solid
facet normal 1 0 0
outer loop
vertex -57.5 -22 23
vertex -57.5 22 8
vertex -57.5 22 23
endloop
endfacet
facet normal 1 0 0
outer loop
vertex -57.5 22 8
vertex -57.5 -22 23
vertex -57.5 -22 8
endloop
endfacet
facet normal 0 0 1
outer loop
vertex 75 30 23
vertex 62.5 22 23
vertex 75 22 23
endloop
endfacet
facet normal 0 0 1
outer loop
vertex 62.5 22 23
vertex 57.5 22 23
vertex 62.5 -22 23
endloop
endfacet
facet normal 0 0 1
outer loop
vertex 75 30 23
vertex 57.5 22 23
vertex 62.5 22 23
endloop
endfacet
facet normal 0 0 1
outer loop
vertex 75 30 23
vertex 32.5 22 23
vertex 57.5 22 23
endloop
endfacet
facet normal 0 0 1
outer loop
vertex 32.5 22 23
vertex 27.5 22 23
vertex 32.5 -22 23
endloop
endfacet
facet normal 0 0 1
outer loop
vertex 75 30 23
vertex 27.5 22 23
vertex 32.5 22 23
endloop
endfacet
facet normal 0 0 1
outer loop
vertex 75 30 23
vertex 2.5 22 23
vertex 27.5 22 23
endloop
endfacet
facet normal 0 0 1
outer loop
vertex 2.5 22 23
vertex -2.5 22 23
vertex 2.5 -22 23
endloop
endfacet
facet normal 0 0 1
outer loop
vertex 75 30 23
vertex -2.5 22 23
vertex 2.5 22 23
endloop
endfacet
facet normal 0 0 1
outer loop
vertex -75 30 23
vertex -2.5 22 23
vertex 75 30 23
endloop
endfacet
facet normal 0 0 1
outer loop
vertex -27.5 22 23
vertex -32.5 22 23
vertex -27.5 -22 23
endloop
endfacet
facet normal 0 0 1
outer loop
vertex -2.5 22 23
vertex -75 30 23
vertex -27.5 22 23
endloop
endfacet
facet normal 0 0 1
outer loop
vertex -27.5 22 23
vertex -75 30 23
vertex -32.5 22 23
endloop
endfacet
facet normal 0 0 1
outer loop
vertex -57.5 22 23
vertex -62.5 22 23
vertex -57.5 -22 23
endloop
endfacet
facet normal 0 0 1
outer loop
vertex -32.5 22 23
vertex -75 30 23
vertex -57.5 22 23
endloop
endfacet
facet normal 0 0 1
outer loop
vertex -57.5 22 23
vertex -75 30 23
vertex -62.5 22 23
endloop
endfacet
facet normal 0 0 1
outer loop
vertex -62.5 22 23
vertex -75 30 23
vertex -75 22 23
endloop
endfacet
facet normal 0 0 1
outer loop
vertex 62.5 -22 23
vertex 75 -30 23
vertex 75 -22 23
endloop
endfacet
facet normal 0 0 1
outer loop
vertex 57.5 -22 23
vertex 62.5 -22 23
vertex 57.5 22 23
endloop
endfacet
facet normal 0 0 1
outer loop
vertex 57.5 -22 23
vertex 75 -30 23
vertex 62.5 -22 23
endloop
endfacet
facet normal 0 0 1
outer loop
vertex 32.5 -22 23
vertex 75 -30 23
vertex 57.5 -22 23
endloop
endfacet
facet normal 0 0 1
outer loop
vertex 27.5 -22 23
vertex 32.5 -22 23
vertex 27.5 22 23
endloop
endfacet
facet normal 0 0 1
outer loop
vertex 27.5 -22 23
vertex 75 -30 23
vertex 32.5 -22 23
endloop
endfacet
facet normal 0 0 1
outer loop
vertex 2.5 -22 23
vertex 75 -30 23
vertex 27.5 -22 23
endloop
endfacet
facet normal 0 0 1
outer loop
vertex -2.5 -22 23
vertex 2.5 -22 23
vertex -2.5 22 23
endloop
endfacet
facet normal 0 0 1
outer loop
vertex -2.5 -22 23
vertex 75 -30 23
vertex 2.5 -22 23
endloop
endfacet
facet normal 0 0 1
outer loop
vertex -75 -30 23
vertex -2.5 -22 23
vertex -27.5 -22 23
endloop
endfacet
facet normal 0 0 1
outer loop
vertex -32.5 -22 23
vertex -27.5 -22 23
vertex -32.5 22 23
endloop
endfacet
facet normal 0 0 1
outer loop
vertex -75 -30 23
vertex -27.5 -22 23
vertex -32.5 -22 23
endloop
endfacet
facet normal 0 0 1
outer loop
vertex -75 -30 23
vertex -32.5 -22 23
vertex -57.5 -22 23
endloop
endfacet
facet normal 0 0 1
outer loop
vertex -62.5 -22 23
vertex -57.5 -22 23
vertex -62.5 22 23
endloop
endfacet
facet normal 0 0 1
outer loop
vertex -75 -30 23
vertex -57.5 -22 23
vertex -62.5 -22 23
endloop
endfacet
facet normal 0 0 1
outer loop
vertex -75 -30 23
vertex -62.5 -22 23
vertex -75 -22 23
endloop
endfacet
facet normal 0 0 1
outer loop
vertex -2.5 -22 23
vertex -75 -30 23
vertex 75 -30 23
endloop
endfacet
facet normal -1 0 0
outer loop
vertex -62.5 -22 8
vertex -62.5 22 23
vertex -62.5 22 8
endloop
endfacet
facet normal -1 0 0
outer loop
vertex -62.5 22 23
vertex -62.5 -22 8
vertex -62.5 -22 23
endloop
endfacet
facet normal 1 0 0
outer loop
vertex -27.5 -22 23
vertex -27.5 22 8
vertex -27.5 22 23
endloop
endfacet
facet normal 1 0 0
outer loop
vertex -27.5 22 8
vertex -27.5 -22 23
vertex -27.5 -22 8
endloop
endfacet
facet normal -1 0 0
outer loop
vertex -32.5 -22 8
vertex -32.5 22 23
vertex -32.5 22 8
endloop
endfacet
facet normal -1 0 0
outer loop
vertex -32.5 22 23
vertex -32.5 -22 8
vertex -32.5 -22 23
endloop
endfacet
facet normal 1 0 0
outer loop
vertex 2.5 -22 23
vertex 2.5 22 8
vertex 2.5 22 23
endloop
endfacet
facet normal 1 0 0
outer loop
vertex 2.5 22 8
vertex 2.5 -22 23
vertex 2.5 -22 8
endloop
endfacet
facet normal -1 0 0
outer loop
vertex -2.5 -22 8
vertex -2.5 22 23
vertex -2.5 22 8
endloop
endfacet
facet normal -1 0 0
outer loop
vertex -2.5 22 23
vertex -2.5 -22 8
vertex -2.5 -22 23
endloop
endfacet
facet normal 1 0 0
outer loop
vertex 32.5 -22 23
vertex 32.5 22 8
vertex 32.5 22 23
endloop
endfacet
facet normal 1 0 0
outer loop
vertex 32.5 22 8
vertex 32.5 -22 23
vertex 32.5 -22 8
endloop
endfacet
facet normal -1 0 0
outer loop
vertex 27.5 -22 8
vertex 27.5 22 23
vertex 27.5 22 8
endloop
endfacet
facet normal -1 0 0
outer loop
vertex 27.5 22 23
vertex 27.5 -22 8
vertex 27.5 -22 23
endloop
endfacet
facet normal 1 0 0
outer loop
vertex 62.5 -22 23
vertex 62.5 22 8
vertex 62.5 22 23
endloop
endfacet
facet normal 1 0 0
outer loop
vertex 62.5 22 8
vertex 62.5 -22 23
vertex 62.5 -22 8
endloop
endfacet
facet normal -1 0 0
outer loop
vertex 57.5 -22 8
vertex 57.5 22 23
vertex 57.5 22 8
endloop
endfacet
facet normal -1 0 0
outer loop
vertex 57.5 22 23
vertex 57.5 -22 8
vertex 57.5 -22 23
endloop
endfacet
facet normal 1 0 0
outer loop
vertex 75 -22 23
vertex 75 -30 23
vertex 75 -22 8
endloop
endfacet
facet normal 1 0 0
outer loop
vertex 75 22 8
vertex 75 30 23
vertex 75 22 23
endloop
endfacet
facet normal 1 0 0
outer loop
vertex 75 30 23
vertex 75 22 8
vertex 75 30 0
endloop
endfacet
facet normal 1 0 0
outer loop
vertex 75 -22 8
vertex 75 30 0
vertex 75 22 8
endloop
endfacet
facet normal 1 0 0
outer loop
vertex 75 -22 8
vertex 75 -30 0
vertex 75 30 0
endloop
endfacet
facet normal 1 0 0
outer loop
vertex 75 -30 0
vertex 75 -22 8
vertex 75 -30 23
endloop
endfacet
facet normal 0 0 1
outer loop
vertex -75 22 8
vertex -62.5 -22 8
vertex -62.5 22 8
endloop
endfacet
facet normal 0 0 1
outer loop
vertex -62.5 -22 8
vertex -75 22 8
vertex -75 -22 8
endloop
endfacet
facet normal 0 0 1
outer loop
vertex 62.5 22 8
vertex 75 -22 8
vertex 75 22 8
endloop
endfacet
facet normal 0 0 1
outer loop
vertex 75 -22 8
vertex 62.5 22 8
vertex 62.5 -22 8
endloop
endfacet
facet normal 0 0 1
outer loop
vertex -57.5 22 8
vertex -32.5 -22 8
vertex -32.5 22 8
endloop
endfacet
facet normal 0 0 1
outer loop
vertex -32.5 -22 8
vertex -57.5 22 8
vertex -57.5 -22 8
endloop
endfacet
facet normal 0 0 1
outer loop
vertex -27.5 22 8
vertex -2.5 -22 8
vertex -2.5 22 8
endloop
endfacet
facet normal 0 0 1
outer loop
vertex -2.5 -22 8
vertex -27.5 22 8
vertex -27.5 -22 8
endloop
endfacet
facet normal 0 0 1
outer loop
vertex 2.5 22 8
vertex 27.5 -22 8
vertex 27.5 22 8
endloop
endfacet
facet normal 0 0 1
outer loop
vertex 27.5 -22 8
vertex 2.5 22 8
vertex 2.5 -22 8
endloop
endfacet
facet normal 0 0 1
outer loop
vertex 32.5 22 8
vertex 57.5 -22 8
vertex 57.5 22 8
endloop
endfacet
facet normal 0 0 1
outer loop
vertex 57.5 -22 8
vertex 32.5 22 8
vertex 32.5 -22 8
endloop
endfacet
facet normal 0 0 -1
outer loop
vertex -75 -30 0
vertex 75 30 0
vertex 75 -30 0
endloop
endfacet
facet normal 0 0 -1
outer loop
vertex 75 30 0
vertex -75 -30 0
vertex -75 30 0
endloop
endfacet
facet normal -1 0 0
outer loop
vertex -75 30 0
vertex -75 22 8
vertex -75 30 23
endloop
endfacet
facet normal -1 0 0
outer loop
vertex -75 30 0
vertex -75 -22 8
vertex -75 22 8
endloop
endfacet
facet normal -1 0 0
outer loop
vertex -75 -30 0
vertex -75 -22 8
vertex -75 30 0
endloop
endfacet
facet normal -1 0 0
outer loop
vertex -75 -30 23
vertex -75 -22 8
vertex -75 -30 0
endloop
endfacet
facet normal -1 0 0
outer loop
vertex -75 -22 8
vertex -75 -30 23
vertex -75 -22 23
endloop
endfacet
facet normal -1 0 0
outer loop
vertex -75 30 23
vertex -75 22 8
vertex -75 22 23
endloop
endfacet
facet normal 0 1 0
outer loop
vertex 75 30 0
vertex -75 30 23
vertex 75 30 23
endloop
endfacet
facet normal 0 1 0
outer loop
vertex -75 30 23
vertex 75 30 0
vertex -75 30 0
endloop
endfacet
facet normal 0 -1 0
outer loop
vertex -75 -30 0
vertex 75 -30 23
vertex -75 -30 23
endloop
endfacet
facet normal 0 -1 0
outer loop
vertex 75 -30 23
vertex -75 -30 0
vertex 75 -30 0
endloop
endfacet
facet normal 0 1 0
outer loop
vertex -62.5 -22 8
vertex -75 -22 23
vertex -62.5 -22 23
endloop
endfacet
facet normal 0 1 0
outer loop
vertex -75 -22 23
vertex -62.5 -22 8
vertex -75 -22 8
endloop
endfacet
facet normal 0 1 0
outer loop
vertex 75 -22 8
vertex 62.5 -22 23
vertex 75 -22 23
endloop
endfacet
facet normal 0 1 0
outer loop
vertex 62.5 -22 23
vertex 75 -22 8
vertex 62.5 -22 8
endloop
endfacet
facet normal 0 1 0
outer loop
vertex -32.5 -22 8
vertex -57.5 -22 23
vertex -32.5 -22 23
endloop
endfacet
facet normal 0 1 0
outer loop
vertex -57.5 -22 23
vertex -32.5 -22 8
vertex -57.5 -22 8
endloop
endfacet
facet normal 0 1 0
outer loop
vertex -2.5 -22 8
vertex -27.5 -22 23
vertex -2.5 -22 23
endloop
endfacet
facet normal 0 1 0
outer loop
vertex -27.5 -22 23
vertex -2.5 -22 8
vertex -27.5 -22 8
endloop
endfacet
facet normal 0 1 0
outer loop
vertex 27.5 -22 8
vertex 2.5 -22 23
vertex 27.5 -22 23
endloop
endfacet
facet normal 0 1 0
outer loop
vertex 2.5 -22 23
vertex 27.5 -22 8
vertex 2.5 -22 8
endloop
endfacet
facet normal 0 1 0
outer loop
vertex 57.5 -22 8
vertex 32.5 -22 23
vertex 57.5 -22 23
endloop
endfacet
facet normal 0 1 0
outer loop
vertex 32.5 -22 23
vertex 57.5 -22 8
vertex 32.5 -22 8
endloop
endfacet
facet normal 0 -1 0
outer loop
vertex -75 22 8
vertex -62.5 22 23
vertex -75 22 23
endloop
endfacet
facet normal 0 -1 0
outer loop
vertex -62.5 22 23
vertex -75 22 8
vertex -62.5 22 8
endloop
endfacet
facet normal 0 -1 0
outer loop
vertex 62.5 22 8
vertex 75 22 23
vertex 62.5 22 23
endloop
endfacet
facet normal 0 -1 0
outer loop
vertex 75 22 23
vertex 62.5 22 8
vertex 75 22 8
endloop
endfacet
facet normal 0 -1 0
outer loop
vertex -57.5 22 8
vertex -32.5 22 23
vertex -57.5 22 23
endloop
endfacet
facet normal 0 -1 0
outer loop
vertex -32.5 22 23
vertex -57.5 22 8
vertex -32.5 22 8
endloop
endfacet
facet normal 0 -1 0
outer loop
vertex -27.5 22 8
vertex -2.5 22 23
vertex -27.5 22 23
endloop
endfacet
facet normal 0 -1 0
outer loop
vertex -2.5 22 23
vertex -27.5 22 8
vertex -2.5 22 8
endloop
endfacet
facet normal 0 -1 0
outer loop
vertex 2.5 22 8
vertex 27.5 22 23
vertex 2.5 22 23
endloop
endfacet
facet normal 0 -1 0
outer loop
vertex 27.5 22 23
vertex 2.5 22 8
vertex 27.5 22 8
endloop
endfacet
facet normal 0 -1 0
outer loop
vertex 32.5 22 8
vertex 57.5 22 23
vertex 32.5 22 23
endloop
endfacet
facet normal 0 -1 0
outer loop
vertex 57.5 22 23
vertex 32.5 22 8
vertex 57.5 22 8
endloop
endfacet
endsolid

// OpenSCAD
$fn = 32;

// ----------------------------------------------------------------------
// Rib frame 150 x 60 x 23
// 5 ribs at 30 mm pitch
// ----------------------------------------------------------------------

// --- parameters (mm) ---
frame = [150, 60, 8];  // base plate size (x, y, z)
rail_w = 8;            // side rail width
ribs = 5;              // number of ribs
rib_t = 5;             // rib thickness
rib_h = 15;            // rib height above the base plate
pitch = 30;            // pitch between rib centres

// --- derived feature positions (mm) ---
span = (ribs - 1) * pitch;          // = 120   distance between the outer ribs
origin_x = -span / 2;               // = -60   X of the first rib
rib_len = frame[1] - 2 * rail_w + 2;  // = 46   rib length, 1 mm into each rail
feature_centers = [
  [origin_x + 0 * pitch, 0],
  [origin_x + 1 * pitch, 0],
  [origin_x + 2 * pitch, 0],
  [origin_x + 3 * pitch, 0],
  [origin_x + 4 * pitch, 0]
];   // rib centre line, drives the rib loop

// base plate, two side rails, then the ribs read straight off feature_centers
union() {
  translate([-frame[0] / 2, -frame[1] / 2, 0]) cube(frame);
  translate([-frame[0] / 2, -frame[1] / 2, 0]) cube([frame[0], rail_w, frame[2] + rib_h]);
  translate([-frame[0] / 2, frame[1] / 2 - rail_w, 0]) cube([frame[0], rail_w, frame[2] + rib_h]);
  for (centre = feature_centers)
    translate([centre[0] - rib_t / 2, centre[1] - rib_len / 2, frame[2] - 1])
      cube([rib_t, rib_len, rib_h + 1]);
}
